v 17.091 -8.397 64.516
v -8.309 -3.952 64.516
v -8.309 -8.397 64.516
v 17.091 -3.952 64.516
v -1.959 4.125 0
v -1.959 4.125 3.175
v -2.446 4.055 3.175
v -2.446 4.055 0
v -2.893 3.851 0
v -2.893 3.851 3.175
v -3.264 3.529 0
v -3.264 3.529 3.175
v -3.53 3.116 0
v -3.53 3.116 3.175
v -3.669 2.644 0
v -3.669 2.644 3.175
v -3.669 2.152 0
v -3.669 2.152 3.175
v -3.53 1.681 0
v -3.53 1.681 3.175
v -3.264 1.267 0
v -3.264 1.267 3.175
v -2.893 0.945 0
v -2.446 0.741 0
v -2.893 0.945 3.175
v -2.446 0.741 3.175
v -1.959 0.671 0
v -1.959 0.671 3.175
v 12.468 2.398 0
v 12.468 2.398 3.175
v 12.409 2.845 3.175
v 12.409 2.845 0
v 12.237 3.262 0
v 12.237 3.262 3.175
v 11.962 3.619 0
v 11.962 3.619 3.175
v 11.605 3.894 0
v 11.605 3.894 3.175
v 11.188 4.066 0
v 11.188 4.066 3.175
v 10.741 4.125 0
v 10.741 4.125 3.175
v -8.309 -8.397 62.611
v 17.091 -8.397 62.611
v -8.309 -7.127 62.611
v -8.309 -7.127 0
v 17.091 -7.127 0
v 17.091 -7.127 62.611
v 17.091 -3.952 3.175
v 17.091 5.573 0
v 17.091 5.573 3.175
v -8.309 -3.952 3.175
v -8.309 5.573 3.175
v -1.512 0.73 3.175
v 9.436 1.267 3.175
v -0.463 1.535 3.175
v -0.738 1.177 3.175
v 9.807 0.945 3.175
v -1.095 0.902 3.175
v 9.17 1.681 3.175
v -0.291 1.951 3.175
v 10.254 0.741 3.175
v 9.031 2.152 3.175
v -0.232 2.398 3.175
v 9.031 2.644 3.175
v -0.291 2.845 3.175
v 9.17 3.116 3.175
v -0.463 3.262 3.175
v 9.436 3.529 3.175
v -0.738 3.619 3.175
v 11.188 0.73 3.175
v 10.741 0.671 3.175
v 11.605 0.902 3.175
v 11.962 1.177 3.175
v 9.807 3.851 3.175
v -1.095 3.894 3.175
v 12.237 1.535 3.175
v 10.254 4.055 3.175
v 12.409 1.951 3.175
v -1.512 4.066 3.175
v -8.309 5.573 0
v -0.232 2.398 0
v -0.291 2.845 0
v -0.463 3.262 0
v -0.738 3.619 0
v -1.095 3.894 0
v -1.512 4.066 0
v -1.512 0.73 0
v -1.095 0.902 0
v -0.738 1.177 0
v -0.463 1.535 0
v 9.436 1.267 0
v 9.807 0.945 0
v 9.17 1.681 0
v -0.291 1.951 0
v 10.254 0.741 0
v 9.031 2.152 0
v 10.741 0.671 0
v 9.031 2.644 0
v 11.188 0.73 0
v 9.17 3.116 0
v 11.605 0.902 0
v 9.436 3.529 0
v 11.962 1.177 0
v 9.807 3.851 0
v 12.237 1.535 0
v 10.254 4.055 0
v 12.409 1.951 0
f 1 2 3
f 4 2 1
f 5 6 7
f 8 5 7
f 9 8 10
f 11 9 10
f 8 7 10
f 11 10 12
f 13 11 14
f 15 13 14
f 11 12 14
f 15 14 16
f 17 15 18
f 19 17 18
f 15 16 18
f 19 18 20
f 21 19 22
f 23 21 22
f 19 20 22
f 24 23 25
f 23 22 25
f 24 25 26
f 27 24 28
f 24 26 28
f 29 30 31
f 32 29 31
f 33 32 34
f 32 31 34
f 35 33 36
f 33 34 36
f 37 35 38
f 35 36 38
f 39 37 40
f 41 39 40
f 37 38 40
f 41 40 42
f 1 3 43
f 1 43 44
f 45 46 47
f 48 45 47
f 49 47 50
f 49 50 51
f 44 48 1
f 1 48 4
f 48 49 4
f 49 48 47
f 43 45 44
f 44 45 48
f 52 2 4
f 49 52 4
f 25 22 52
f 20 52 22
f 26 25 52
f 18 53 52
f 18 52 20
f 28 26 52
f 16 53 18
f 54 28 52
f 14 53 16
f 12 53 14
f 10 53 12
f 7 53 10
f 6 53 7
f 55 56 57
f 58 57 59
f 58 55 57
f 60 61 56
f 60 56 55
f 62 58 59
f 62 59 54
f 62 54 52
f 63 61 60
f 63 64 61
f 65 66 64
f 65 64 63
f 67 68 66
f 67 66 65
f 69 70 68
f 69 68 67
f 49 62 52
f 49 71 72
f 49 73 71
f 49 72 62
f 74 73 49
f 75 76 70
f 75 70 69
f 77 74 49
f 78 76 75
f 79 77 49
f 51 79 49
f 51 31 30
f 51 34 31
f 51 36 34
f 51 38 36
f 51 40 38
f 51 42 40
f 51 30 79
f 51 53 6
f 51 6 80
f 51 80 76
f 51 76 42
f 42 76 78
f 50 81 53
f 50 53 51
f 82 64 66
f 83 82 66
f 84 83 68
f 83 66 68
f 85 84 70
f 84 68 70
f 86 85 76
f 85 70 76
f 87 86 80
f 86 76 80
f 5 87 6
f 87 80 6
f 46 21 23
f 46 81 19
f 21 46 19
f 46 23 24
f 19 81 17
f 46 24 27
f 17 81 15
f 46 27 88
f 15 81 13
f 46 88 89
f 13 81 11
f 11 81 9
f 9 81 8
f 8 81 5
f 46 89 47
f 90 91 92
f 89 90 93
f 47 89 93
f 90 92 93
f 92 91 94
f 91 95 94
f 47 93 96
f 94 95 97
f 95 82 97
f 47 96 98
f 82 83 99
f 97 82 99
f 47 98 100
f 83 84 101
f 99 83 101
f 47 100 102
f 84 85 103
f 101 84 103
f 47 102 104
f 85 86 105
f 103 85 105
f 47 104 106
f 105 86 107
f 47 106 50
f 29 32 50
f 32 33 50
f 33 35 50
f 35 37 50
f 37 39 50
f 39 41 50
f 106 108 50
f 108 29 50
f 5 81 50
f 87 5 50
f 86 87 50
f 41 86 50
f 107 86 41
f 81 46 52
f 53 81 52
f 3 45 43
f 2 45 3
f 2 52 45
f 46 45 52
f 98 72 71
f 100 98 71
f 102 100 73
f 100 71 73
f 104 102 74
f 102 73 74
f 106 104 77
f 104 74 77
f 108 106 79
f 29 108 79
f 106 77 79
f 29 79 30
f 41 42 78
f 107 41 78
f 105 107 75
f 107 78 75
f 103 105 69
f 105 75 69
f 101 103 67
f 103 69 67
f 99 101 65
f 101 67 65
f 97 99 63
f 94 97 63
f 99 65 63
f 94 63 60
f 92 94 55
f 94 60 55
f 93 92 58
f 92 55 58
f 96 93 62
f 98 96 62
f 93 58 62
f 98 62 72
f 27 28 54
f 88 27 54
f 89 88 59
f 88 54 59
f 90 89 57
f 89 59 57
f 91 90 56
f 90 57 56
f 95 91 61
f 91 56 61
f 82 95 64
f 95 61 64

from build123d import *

# Parameters (mm, degrees)
SKETCH1_W           = 25.4
SKETCH1_H           = 12.7
BOSS_EXTRUDE1_DEPTH = 3.175
CUT_EXTRUDE1_DEPTH  = 3.175
SKETCH3_W           = 25.4
SKETCH3_H           = 3.175
BOSS_EXTRUDE2_DEPTH = 61.341
SKETCH4_W           = 25.4
SKETCH4_H           = 1.905
BOSS_EXTRUDE3_DEPTH = 1.27


with BuildPart() as part:
    # Sketch1 → Boss-Extrude1 (new body)
    with BuildSketch(Plane.XY):
        with Locations((4.390957447, -0.776861702)):
            Rectangle(SKETCH1_W, SKETCH1_H)
    extrude(amount=BOSS_EXTRUDE1_DEPTH)

    # Sketch2 → Cut-Extrude1 (cut)
    with BuildSketch(Plane.XY.offset(3.175)):
        with BuildLine():
            ThreePointArc((12.468157447, 2.398138298), (11.962272279, 3.61945313), (10.740957447, 4.125338298))
            Line((10.740957447, 4.125338298), (10.740957447, 0.670938298))
            ThreePointArc((10.740957447, 0.670938298), (11.962272279, 1.176823465), (12.468157447, 2.398138298))
        make_face()
        with BuildLine():
            Line((10.740957447, 0.670938298), (10.740957447, 4.125338298))
            ThreePointArc((10.740957447, 4.125338298), (9.013757447, 2.398138298), (10.740957447, 0.670938298))
        make_face()
        with BuildLine():
            ThreePointArc((-0.231842553, 2.398138298), (-0.737727721, 3.61945313), (-1.959042553, 4.125338298))
            Line((-1.959042553, 4.125338298), (-1.959042553, 0.670938298))
            ThreePointArc((-1.959042553, 0.670938298), (-0.737727721, 1.176823465), (-0.231842553, 2.398138298))
        make_face()
        with BuildLine():
            Line((-1.959042553, 0.670938298), (-1.959042553, 4.125338298))
            ThreePointArc((-1.959042553, 4.125338298), (-3.686242553, 2.398138298), (-1.959042553, 0.670938298))
        make_face()
    extrude(amount=-CUT_EXTRUDE1_DEPTH, mode=Mode.SUBTRACT)

    # Sketch3 → Boss-Extrude2 (add)
    with BuildSketch(Plane.XY.offset(3.175)):
        with Locations((4.390957447, -5.539361702)):
            Rectangle(SKETCH3_W, SKETCH3_H)
    extrude(amount=BOSS_EXTRUDE2_DEPTH)

    # Sketch4 → Boss-Extrude3 (add)
    with BuildSketch(Plane.XZ.offset(7.126861702)):
        with Locations((4.390957447, 63.5635)):
            Rectangle(SKETCH4_W, SKETCH4_H)
    extrude(amount=BOSS_EXTRUDE3_DEPTH)


solid = part.part
